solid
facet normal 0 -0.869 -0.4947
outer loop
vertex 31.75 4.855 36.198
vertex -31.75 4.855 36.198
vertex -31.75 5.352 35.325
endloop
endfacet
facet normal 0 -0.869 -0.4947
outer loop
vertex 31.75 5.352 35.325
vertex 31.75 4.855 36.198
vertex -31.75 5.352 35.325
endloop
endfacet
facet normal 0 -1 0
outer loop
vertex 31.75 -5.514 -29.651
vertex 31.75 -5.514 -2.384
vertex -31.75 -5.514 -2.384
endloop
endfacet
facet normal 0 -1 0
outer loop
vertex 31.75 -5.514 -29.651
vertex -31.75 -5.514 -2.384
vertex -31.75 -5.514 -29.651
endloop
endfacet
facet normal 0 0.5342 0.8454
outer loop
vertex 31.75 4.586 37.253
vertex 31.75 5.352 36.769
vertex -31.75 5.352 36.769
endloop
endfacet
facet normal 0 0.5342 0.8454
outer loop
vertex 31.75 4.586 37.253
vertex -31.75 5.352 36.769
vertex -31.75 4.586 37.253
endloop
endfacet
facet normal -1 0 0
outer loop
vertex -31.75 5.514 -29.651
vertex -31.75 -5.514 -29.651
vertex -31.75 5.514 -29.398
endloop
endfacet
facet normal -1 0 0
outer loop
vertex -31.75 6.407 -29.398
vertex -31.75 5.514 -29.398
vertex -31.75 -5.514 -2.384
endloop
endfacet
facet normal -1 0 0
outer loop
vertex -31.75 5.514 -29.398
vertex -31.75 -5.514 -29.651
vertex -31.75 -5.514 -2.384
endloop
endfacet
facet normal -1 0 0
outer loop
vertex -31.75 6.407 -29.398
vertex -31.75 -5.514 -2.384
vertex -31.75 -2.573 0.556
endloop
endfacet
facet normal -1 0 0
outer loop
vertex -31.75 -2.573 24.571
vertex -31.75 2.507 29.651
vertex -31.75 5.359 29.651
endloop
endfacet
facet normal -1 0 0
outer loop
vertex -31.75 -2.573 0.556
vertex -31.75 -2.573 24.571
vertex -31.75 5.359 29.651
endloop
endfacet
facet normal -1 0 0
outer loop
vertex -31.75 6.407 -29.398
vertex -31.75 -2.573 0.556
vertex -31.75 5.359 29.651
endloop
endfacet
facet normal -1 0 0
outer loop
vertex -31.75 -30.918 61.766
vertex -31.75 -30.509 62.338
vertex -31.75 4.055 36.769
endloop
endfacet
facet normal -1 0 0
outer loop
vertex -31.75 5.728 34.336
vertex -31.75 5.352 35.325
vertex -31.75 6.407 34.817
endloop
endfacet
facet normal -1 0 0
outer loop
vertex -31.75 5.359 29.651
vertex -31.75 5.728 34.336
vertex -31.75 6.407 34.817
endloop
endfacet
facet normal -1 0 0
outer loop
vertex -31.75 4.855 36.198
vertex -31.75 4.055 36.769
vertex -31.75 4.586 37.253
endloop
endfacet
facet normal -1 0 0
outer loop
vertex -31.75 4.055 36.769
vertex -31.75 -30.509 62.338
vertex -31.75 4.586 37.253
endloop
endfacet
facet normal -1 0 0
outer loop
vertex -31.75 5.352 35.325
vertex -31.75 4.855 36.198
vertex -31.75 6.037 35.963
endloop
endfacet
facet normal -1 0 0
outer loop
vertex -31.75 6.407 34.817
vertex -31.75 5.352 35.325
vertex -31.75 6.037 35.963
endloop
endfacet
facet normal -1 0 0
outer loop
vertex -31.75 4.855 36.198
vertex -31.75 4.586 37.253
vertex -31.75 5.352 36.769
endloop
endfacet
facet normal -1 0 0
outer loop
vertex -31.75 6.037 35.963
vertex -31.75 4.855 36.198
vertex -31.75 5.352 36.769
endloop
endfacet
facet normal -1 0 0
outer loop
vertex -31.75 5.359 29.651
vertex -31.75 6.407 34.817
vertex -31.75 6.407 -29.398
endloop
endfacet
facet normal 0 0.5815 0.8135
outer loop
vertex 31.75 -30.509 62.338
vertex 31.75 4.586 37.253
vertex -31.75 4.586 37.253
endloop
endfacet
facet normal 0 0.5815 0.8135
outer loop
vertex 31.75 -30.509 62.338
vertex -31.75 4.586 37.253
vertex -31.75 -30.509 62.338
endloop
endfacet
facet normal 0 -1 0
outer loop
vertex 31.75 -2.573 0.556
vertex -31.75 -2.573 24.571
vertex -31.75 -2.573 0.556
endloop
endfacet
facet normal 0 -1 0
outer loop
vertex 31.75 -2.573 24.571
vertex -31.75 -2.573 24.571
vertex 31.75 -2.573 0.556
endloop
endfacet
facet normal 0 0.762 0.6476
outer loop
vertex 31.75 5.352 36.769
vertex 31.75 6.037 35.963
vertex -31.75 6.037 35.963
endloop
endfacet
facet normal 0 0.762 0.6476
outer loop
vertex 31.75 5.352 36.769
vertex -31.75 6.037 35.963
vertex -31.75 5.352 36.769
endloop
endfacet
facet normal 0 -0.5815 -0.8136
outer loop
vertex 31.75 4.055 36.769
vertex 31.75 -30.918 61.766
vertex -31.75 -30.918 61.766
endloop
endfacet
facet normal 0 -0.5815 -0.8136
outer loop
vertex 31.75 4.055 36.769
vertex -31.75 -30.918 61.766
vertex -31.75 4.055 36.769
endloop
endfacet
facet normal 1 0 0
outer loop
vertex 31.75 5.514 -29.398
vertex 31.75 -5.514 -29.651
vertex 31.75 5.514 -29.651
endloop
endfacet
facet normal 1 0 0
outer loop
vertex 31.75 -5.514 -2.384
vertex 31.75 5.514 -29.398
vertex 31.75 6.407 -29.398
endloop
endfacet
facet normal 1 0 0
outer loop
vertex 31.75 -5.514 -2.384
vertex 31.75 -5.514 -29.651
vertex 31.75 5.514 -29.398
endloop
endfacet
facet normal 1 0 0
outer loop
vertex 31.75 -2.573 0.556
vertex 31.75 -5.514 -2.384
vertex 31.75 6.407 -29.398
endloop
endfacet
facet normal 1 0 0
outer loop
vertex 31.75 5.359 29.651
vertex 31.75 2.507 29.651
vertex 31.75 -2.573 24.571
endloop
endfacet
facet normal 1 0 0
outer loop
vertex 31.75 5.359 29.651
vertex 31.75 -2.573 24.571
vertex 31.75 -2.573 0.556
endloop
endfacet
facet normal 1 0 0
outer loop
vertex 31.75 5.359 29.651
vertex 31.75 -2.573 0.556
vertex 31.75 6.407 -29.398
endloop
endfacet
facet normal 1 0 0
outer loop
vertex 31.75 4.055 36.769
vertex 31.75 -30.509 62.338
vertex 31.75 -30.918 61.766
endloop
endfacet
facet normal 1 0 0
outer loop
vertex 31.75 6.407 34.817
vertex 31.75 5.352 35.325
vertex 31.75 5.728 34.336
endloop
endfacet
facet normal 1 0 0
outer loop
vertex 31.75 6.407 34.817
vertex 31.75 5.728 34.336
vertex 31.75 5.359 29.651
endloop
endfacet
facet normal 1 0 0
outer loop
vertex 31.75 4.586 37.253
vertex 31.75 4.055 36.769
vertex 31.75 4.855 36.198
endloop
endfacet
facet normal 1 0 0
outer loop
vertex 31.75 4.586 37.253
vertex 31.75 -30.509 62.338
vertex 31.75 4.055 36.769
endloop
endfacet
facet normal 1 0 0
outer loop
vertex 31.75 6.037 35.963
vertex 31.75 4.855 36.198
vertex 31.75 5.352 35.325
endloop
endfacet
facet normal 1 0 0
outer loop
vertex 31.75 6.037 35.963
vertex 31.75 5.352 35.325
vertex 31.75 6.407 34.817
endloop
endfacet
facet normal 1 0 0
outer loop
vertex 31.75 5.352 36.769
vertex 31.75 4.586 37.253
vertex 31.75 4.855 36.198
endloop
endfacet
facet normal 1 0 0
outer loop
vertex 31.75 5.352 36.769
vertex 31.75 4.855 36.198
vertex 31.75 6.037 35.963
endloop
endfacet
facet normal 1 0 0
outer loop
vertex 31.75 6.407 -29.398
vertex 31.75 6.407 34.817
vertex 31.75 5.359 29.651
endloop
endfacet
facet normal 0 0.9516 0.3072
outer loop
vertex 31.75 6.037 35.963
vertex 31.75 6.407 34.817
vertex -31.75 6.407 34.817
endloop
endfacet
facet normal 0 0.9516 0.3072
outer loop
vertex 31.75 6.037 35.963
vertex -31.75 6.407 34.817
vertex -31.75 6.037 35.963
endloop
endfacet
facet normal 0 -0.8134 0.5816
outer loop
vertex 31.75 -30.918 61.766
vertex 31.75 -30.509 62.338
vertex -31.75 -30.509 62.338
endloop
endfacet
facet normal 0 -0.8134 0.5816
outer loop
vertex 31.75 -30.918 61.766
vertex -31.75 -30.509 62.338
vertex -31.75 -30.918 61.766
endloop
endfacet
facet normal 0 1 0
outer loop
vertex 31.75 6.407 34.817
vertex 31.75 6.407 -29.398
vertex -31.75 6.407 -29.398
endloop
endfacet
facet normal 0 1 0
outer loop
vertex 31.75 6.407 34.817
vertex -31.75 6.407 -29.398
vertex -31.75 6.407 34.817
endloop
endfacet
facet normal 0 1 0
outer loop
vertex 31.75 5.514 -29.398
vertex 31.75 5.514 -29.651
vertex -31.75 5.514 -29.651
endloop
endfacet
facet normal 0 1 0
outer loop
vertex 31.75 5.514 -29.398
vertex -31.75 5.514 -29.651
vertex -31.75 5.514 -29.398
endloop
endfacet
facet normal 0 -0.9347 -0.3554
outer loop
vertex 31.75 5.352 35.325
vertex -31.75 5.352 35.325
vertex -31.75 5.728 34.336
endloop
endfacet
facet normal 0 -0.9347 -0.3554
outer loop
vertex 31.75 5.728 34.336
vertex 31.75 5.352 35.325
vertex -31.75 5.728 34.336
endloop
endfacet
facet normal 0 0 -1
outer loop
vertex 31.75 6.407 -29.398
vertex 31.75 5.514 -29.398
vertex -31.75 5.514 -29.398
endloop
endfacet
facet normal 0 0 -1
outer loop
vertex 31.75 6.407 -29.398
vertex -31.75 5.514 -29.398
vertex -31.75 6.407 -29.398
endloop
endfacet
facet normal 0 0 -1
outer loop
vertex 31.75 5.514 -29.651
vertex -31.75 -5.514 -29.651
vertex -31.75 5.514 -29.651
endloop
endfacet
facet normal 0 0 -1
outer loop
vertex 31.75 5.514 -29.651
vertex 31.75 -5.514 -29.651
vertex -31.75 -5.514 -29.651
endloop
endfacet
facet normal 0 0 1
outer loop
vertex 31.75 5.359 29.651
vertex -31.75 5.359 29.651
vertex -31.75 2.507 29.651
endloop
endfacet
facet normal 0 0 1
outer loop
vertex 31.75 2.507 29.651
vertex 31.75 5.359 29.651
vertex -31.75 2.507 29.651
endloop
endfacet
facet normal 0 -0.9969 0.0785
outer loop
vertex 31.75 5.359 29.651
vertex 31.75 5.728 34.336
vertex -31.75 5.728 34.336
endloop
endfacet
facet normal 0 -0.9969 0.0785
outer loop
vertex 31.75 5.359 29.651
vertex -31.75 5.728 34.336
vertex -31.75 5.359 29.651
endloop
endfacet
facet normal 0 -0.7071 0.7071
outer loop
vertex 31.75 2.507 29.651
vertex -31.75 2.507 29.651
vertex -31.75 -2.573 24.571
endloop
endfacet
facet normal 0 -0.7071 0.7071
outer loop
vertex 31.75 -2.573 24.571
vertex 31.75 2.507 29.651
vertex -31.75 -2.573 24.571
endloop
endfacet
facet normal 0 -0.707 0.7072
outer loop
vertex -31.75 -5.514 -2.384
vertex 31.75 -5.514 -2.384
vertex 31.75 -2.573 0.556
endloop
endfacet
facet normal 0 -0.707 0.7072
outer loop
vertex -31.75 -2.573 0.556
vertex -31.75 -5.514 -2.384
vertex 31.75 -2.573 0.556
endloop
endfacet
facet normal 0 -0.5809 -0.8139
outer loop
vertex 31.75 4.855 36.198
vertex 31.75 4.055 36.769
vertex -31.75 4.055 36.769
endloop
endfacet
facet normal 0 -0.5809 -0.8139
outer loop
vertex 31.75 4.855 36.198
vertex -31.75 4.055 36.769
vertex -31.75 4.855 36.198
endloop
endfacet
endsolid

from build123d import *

# Parameters (mm, degrees)
F1_DEPTH    = 31.75
F2_T1_DEPTH = 89.6282991577
F2_T6_DEPTH = 89.6282991577
F4_DEPTH    = 31.75


# Not quite as in the source:
# - a fillet or chamfer that OpenCascade refuses, or shapes differently, is made with other operations: its cross-section is extruded or revolved along the edge and cut away or added


with BuildPart() as f1:
    # F0 (on Right) → F1 (new body, symmetric)
    with BuildSketch(Plane.YZ):
        Polygon((5.5137062445, 29.6514853835), (-2.5730628986, 29.6514853835), (-2.5730628986, 2.6955895592), (-5.5137062445, 2.6955895592), (-5.5137062445, -29.6514853835), (5.5137062445, -29.6514853835), align=None)
    extrude(amount=F1_DEPTH, both=True)

    # F2: chamfer of 5.08 on 2 edges, made by hand

    # F2_s2 → F2_t1 (cut)
    with BuildSketch(Plane.YZ.offset(-44.8141495789)):
        Polygon((2.5069371014, 29.6514853835), (-2.5730628986, 24.5714853835), (-2.5730628986, 29.6514853835), align=None)
    extrude(amount=F2_T1_DEPTH, mode=Mode.SUBTRACT)


with BuildPart() as f2_tool4:
    # F2_s5 → F2_t6 (new body)
    with BuildSketch(Plane.YZ.offset(-44.8141495789)):
        Polygon((-5.5137062445, -2.3844104408), (-0.4337062445, 2.6955895592), (-5.5137062445, 2.6955895592), align=None)
    extrude(amount=F2_T6_DEPTH)

    split(bisect_by=Plane.XZ.offset(2.5730628986), keep=Keep.TOP)


with BuildPart() as f1_1:
    add(f1.part)

    # F2_t3: cut F2_tool4
    add(f2_tool4.part, mode=Mode.SUBTRACT)

    # F3 (on Right) → F4 (join, symmetric)
    with BuildSketch(Plane.YZ):
        Polygon((5.3522153758, 29.5617226511), (5.411314778, -29.3982010335), (6.4068306237, -29.3982010335), (6.4068306237, 34.8174758255), (6.0373530723, 35.9628349543), (5.3522153758, 36.7688797414), (4.586473573, 37.2525081038), (-30.5093135685, 62.3375996947), (-30.9179358327, 61.7659087381), (4.054645617, 36.7688797414), (4.8554181121, 36.1976027489), (5.3522153758, 35.3252030909), (5.7278168388, 34.3364849687), align=None)
    extrude(amount=F4_DEPTH, both=True)


solid = f1_1.part
